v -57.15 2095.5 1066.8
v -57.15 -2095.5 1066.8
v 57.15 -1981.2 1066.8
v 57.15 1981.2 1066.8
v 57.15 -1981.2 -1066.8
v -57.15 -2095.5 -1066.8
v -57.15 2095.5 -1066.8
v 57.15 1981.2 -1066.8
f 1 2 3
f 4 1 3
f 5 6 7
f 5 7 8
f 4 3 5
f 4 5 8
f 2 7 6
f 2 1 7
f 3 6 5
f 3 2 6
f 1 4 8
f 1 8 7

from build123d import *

# Parameters (mm, degrees)
F0_W     = 3987.8
F0_H     = 114.3
F1_DEPTH = 1066.8
F3_W     = 114.3
F3_H     = 3962.4
F4_DEPTH = 1066.8


with BuildPart() as f1:
    # F0 (on Top) → F1 (new body, symmetric)
    with BuildSketch(Plane.XY):
        Polygon((-2108.2, 57.15), (-1993.9, -57.15), (-1993.9, 57.15), align=None)
        Rectangle(F0_W, F0_H)
        Polygon((1993.9, 57.15), (1993.9, -57.15), (2108.2, 57.15), align=None)
    extrude(amount=F1_DEPTH, both=True)


with BuildPart() as f4:
    # F3 (on Top) → F4 (new body, symmetric)
    with BuildSketch(Plane.XY):
        Polygon((-57.15, -2095.5), (57.15, -1981.2), (-57.15, -1981.2), (-57.15, -2002.2456645966), align=None)
        Rectangle(F3_W, F3_H)
        Polygon((-57.15, 1981.2), (57.15, 1981.2), (-57.15, 2095.5), (-57.15, 2002.329826355), align=None)
    extrude(amount=F4_DEPTH, both=True)


solid = f4.part
